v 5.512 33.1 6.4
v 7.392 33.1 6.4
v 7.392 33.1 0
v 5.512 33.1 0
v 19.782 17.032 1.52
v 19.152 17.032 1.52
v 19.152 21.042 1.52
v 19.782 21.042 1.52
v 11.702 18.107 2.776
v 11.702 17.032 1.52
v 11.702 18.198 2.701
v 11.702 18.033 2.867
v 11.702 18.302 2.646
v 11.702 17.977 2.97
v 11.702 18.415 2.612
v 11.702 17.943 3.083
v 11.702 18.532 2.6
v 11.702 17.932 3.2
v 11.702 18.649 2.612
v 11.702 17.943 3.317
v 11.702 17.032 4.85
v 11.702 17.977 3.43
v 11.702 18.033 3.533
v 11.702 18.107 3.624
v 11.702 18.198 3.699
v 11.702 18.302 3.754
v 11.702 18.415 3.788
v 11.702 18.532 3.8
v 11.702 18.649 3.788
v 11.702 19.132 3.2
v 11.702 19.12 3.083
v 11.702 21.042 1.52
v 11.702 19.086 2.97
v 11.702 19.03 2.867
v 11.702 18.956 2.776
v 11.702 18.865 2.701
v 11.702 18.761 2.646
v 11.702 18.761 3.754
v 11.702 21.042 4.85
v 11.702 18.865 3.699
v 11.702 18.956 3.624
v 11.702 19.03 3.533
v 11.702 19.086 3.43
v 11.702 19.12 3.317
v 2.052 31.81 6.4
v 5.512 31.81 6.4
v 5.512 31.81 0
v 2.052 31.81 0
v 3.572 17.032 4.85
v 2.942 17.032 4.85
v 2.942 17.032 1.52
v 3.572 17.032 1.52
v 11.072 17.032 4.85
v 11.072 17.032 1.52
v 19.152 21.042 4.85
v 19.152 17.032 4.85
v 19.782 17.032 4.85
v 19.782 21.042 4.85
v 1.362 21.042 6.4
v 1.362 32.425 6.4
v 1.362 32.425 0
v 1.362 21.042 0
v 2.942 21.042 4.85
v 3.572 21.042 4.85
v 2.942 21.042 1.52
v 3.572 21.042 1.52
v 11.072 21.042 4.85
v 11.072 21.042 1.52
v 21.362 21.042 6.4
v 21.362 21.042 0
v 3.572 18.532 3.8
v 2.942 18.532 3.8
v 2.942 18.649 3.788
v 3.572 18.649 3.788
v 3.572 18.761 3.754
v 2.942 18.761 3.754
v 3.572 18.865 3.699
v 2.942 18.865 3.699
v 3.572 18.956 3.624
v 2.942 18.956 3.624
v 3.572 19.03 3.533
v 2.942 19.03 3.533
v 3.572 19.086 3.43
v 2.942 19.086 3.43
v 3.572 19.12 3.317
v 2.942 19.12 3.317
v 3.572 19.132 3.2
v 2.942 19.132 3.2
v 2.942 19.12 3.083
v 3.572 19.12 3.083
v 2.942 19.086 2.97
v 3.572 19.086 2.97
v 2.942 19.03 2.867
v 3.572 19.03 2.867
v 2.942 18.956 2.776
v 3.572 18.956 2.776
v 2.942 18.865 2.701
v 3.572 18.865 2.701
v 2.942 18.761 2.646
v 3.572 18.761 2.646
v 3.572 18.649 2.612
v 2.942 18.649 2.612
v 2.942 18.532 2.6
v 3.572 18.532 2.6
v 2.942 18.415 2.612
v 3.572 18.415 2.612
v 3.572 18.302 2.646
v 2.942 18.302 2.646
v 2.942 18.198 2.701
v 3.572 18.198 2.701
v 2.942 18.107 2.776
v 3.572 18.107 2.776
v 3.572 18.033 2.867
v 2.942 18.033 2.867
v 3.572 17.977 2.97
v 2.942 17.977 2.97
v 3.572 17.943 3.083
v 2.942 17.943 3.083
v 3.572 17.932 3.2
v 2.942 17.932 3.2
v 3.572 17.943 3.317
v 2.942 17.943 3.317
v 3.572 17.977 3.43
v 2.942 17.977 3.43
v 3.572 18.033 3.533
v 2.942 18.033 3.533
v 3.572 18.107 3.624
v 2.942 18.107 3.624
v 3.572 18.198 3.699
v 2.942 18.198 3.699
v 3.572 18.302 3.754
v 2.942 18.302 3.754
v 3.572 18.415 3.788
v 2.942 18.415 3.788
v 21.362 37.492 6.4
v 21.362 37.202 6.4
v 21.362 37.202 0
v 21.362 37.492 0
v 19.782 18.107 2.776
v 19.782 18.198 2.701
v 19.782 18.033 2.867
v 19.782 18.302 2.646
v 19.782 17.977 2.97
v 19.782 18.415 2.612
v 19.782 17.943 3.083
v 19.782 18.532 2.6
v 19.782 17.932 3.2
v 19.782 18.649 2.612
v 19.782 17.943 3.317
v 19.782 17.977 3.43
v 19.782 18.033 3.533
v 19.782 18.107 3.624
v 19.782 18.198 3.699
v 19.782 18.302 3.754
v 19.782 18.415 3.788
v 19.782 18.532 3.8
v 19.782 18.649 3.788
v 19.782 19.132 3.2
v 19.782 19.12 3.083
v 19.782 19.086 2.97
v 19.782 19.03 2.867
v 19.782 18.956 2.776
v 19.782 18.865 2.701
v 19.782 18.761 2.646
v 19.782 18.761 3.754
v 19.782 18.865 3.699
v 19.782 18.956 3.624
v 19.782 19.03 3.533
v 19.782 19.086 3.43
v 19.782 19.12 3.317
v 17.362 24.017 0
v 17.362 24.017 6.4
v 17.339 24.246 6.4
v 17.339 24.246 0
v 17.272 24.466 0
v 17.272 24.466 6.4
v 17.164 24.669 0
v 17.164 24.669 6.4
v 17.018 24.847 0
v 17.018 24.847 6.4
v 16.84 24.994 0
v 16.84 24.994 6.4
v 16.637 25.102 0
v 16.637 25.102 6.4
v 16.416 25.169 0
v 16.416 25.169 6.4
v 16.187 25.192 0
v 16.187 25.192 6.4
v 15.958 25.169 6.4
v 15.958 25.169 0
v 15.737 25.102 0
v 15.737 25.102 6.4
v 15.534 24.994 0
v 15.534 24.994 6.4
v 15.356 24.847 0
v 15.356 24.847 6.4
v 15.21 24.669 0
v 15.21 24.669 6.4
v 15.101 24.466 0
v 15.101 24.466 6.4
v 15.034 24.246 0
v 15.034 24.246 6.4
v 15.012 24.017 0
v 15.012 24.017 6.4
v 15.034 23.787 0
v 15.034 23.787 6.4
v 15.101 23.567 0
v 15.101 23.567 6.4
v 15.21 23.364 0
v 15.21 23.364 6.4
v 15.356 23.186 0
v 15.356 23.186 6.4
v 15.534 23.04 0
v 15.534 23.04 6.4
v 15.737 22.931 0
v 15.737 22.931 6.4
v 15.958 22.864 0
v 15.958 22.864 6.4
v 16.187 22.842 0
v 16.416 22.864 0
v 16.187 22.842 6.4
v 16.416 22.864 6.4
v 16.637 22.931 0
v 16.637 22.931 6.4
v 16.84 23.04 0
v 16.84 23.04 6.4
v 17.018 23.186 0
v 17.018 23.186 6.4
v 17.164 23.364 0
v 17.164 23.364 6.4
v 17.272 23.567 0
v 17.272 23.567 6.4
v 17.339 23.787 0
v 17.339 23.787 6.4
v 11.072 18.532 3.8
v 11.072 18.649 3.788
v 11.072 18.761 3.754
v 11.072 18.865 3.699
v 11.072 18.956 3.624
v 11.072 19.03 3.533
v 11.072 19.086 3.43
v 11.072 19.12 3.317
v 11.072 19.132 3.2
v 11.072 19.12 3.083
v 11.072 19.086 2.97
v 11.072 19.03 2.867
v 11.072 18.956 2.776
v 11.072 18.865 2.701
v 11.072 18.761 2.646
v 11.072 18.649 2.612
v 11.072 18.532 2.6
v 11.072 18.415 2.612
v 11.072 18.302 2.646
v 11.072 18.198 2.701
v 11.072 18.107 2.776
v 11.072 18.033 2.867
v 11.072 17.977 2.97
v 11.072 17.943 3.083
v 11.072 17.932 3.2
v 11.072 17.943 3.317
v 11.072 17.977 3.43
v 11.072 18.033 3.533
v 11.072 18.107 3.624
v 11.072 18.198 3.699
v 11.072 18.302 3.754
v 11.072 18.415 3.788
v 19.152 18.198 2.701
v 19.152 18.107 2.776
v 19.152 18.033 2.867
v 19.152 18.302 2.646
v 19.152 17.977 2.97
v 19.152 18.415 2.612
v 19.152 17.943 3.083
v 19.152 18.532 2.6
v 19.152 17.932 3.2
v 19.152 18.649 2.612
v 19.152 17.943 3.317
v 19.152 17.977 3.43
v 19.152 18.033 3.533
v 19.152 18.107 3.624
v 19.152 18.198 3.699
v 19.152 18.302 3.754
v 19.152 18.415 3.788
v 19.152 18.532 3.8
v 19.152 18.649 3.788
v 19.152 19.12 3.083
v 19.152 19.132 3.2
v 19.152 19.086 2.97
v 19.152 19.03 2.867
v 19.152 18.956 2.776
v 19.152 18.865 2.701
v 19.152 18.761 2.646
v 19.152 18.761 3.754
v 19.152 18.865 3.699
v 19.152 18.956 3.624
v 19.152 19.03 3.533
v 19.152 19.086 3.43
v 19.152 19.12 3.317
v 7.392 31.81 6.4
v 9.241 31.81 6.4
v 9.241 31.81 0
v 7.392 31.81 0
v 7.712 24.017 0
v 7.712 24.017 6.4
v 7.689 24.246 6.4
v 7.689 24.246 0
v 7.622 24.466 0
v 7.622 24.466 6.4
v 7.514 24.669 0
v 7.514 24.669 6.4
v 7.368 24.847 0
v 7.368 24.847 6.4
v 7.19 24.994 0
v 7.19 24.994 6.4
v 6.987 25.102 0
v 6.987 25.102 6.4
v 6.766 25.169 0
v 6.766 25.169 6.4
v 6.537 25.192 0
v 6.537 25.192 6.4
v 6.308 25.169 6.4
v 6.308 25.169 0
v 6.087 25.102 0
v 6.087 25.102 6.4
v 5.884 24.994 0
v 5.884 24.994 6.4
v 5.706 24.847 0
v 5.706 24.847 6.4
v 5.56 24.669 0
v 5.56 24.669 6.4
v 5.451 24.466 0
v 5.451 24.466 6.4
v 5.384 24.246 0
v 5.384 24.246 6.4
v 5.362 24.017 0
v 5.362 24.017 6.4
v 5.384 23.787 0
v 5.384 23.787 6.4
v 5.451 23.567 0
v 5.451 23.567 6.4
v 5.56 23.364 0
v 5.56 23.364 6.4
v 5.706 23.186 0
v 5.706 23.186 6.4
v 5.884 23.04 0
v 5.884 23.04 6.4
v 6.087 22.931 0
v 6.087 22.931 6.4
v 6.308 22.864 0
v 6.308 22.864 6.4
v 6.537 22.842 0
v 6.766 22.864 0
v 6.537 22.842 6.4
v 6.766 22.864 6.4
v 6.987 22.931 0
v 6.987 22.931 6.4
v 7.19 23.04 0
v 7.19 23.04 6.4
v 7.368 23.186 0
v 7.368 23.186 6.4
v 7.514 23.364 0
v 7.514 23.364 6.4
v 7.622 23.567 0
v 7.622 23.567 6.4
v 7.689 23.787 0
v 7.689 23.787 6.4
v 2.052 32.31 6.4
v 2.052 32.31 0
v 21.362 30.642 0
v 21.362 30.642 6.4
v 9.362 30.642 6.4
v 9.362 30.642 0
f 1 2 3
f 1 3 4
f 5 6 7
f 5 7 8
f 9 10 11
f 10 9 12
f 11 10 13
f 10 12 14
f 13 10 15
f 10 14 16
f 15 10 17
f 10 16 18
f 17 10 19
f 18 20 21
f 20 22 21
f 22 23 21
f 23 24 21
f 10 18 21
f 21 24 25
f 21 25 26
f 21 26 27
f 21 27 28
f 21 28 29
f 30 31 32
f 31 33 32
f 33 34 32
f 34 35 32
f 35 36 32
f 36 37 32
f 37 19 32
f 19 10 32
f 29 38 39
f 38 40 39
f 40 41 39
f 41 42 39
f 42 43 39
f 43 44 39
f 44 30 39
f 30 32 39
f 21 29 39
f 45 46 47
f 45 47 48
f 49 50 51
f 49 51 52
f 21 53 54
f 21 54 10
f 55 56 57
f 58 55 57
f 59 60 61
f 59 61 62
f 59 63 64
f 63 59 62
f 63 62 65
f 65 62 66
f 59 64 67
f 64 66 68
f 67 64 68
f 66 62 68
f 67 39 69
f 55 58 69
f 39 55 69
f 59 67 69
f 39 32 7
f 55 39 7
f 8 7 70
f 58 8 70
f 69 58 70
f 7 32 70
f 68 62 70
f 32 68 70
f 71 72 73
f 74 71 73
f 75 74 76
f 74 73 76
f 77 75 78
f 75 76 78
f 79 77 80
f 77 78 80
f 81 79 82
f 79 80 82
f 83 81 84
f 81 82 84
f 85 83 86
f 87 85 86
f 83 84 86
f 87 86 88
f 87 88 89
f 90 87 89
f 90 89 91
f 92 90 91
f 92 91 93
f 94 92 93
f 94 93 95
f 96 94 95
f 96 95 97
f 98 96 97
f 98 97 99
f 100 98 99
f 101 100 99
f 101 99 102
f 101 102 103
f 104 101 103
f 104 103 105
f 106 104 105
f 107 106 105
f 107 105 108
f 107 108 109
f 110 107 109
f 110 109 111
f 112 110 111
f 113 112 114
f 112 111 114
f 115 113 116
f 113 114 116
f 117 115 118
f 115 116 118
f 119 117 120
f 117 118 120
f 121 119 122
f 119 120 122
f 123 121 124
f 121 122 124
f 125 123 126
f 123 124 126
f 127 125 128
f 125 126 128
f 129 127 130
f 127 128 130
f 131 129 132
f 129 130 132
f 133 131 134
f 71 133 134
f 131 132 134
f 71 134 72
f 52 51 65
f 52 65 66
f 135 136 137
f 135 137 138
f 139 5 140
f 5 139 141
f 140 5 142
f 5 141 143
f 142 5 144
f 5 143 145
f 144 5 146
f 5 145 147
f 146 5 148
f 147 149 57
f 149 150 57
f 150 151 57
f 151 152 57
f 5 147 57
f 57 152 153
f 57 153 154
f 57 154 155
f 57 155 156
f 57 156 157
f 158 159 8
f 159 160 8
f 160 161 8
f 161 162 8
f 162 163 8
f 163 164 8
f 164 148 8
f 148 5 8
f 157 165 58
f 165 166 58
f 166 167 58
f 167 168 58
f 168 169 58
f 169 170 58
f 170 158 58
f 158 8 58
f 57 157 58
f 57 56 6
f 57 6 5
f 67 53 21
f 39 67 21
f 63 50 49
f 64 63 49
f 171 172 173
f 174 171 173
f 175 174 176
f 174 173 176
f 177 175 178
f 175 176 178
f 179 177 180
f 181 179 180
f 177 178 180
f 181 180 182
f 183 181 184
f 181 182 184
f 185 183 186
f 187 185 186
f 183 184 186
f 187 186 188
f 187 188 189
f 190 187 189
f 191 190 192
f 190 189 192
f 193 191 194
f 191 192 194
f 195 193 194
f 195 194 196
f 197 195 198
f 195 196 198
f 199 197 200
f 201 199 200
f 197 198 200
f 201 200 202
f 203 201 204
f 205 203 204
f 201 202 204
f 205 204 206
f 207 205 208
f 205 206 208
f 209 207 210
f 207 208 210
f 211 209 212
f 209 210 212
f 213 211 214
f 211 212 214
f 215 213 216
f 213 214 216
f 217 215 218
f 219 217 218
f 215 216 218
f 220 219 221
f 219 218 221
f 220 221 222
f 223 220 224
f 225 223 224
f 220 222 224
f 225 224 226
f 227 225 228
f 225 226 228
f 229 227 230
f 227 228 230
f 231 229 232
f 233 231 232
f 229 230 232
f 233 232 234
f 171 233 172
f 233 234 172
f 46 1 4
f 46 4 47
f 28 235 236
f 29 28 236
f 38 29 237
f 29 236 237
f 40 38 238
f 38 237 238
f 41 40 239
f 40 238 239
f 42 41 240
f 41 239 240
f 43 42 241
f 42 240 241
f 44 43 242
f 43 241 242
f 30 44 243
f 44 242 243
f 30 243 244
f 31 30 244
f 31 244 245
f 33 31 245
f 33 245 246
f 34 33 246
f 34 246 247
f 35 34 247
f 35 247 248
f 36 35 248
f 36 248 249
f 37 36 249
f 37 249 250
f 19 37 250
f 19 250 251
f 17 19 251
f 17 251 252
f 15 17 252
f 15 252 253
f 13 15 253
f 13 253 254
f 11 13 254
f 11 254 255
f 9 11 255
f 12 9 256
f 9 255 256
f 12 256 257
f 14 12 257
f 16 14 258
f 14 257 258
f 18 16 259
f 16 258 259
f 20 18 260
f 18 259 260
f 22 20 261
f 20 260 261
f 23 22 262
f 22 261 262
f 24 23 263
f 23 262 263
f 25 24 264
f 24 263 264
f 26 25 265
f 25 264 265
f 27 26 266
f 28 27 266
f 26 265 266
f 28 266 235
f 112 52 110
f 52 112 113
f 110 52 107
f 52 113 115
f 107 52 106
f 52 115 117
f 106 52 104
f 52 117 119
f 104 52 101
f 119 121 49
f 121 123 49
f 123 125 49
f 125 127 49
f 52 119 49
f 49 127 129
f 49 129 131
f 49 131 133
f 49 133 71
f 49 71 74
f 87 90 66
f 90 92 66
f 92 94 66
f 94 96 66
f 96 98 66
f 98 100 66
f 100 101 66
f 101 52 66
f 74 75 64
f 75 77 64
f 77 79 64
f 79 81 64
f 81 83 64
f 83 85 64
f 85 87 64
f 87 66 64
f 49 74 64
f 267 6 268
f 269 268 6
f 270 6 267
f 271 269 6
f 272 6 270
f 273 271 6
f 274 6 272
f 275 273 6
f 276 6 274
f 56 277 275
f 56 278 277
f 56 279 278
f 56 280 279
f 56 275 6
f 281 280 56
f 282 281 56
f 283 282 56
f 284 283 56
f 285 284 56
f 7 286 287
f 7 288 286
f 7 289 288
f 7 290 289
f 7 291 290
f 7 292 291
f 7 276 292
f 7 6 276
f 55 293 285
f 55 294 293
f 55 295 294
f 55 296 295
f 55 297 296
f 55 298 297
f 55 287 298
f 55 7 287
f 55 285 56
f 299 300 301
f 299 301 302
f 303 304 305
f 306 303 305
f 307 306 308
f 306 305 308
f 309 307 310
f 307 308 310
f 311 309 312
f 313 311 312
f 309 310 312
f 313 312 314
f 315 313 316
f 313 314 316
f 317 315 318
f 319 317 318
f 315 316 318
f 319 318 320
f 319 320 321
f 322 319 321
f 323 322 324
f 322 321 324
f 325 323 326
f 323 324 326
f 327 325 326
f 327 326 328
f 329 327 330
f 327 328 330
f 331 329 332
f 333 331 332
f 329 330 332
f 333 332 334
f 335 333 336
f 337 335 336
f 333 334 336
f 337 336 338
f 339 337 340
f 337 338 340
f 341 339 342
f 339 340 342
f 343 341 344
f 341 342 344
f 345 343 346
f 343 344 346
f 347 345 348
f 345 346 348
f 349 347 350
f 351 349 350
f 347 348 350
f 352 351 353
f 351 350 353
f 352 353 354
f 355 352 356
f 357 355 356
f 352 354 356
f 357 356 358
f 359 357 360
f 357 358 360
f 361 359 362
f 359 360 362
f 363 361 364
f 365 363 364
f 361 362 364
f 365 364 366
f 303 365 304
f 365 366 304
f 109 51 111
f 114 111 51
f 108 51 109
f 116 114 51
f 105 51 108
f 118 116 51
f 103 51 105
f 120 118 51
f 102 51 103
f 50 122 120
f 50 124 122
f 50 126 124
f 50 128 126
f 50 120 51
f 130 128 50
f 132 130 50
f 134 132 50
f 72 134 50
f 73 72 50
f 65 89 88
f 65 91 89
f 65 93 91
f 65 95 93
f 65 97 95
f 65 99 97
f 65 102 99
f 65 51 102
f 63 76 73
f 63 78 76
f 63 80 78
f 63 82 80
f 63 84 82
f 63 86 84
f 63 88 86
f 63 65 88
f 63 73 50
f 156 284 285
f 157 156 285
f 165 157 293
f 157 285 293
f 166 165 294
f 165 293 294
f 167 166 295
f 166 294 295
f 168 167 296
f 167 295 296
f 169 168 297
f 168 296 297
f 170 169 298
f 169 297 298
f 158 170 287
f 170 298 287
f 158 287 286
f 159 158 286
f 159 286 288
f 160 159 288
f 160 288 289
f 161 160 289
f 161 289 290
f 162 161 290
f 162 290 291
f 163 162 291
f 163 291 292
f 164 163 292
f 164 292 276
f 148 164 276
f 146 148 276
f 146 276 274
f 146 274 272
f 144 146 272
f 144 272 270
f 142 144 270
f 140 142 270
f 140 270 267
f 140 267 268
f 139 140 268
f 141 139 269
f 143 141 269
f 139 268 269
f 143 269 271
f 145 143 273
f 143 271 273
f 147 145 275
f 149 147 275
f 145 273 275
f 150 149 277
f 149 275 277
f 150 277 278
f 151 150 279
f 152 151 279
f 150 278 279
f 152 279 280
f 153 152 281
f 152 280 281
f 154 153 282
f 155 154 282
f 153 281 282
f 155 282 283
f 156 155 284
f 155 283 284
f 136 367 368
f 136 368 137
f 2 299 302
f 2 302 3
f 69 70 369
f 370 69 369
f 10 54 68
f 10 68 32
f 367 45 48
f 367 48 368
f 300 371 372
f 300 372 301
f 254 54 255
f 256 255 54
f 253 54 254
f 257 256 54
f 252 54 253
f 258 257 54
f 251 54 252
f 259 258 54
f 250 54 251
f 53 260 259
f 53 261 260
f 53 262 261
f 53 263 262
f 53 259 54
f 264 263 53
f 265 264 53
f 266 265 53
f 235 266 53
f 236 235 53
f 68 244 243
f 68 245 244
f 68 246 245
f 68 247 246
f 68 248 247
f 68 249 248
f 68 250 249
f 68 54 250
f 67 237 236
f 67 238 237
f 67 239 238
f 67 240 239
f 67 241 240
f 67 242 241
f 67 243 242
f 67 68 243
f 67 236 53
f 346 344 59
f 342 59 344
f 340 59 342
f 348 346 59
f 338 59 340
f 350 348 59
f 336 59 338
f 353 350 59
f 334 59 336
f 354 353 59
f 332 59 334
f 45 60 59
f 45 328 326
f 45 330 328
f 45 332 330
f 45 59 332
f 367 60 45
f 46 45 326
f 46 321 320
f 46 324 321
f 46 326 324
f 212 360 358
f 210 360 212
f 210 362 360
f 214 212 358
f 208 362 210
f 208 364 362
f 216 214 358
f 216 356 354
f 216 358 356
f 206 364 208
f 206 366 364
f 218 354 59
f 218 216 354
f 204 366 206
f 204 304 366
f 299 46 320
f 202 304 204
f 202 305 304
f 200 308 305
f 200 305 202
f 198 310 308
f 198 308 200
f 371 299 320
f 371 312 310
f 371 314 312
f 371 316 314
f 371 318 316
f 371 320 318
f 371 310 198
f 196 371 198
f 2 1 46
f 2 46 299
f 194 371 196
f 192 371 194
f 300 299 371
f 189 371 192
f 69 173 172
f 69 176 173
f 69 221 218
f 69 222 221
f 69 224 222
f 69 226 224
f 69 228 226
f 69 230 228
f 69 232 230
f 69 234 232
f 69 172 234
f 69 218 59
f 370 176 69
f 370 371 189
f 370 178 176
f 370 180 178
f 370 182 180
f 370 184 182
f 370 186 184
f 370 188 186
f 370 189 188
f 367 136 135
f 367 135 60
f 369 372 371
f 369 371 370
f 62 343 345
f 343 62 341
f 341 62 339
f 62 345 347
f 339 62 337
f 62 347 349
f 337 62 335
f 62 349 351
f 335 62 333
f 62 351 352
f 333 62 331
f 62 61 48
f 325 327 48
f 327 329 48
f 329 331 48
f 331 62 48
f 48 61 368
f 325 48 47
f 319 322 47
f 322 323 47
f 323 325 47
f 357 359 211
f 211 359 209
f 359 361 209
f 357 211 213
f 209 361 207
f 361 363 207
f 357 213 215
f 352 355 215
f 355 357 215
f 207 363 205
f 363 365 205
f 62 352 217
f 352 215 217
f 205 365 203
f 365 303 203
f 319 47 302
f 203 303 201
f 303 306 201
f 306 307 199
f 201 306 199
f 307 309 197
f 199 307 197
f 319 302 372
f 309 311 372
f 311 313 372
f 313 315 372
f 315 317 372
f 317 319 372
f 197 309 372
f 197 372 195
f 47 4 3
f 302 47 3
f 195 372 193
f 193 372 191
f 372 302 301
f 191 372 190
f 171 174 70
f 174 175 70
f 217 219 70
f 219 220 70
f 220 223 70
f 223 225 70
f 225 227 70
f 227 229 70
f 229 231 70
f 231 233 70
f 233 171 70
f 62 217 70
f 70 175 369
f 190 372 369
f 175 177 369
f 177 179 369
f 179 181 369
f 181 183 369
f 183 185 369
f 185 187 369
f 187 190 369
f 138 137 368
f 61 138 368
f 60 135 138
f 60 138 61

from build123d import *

# Parameters (mm, degrees)
ESQUISSE1_W             = 20
ESQUISSE1_H             = 9.6
BOSS_EXTRU_1_DEPTH      = 6.4
ESQUISSE2_R             = 1.175
ENL_V_MAT_EXTRU_1_DEPTH = 6.4
BOSS_EXTRU_66_DEPTH     = 6.4
ESQUISSE5_W             = 0.63
ESQUISSE5_H             = 3.33
BOSS_EXTRU_67_DEPTH     = 4.01
ESQUISSE6_R             = 0.6
ENL_V_MAT_EXTRU_2_DEPTH = 19.01


with BuildPart() as part:
    # Esquisse1 → Boss.-Extru.1 (new body)
    with BuildSketch(Plane.XY):
        with Locations((11.361848554, 25.841592458)):
            Rectangle(ESQUISSE1_W, ESQUISSE1_H)
    extrude(amount=BOSS_EXTRU_1_DEPTH)

    # Esquisse2 → Enlèv. mat.-Extru.1 (cut)
    with BuildSketch(Plane.XY.offset(6.4)):
        with Locations((16.186848554, 24.016592458)):
            Circle(ESQUISSE2_R)
        with Locations((6.536848554, 24.016592458)):
            Circle(ESQUISSE2_R)
    extrude(amount=-ENL_V_MAT_EXTRU_1_DEPTH, mode=Mode.SUBTRACT)

    # Esquisse4 → Boss.-Extru.66 (add)
    with BuildSketch(Plane.XY.offset(6.4)):
        Polygon((1.361848554, 32.424730159), (1.361848554, 30.641592458), (9.361848554, 30.641592458), (9.24123613, 31.809658088), (7.392325504, 31.809658088), (7.392325504, 33.099658088), (5.512325504, 33.099658088), (5.512325504, 31.809658088), (2.052325504, 31.809658088), (2.052325504, 32.309658088), (21.361848554, 37.201602535), (21.361848554, 37.491602535), align=None)
    extrude(amount=-BOSS_EXTRU_66_DEPTH)

    # Esquisse5 → Boss.-Extru.67 (add)
    with BuildSketch(Plane.XZ.offset(-21.041592458)):
        with Locations((3.256848554, 3.185)):
            Rectangle(ESQUISSE5_W, ESQUISSE5_H)
        with Locations((11.386848554, 3.185)):
            Rectangle(ESQUISSE5_W, ESQUISSE5_H)
        with Locations((19.466848554, 3.185)):
            Rectangle(ESQUISSE5_W, ESQUISSE5_H)
    extrude(amount=BOSS_EXTRU_67_DEPTH)

    # Esquisse6 → Enlèv. mat.-Extru.2 (cut)
    with BuildSketch(Plane.ZY.offset(-2.941848554)):
        with Locations((3.2, 18.531592458)):
            Circle(ESQUISSE6_R)
    extrude(amount=-ENL_V_MAT_EXTRU_2_DEPTH, mode=Mode.SUBTRACT)


solid = part.part
